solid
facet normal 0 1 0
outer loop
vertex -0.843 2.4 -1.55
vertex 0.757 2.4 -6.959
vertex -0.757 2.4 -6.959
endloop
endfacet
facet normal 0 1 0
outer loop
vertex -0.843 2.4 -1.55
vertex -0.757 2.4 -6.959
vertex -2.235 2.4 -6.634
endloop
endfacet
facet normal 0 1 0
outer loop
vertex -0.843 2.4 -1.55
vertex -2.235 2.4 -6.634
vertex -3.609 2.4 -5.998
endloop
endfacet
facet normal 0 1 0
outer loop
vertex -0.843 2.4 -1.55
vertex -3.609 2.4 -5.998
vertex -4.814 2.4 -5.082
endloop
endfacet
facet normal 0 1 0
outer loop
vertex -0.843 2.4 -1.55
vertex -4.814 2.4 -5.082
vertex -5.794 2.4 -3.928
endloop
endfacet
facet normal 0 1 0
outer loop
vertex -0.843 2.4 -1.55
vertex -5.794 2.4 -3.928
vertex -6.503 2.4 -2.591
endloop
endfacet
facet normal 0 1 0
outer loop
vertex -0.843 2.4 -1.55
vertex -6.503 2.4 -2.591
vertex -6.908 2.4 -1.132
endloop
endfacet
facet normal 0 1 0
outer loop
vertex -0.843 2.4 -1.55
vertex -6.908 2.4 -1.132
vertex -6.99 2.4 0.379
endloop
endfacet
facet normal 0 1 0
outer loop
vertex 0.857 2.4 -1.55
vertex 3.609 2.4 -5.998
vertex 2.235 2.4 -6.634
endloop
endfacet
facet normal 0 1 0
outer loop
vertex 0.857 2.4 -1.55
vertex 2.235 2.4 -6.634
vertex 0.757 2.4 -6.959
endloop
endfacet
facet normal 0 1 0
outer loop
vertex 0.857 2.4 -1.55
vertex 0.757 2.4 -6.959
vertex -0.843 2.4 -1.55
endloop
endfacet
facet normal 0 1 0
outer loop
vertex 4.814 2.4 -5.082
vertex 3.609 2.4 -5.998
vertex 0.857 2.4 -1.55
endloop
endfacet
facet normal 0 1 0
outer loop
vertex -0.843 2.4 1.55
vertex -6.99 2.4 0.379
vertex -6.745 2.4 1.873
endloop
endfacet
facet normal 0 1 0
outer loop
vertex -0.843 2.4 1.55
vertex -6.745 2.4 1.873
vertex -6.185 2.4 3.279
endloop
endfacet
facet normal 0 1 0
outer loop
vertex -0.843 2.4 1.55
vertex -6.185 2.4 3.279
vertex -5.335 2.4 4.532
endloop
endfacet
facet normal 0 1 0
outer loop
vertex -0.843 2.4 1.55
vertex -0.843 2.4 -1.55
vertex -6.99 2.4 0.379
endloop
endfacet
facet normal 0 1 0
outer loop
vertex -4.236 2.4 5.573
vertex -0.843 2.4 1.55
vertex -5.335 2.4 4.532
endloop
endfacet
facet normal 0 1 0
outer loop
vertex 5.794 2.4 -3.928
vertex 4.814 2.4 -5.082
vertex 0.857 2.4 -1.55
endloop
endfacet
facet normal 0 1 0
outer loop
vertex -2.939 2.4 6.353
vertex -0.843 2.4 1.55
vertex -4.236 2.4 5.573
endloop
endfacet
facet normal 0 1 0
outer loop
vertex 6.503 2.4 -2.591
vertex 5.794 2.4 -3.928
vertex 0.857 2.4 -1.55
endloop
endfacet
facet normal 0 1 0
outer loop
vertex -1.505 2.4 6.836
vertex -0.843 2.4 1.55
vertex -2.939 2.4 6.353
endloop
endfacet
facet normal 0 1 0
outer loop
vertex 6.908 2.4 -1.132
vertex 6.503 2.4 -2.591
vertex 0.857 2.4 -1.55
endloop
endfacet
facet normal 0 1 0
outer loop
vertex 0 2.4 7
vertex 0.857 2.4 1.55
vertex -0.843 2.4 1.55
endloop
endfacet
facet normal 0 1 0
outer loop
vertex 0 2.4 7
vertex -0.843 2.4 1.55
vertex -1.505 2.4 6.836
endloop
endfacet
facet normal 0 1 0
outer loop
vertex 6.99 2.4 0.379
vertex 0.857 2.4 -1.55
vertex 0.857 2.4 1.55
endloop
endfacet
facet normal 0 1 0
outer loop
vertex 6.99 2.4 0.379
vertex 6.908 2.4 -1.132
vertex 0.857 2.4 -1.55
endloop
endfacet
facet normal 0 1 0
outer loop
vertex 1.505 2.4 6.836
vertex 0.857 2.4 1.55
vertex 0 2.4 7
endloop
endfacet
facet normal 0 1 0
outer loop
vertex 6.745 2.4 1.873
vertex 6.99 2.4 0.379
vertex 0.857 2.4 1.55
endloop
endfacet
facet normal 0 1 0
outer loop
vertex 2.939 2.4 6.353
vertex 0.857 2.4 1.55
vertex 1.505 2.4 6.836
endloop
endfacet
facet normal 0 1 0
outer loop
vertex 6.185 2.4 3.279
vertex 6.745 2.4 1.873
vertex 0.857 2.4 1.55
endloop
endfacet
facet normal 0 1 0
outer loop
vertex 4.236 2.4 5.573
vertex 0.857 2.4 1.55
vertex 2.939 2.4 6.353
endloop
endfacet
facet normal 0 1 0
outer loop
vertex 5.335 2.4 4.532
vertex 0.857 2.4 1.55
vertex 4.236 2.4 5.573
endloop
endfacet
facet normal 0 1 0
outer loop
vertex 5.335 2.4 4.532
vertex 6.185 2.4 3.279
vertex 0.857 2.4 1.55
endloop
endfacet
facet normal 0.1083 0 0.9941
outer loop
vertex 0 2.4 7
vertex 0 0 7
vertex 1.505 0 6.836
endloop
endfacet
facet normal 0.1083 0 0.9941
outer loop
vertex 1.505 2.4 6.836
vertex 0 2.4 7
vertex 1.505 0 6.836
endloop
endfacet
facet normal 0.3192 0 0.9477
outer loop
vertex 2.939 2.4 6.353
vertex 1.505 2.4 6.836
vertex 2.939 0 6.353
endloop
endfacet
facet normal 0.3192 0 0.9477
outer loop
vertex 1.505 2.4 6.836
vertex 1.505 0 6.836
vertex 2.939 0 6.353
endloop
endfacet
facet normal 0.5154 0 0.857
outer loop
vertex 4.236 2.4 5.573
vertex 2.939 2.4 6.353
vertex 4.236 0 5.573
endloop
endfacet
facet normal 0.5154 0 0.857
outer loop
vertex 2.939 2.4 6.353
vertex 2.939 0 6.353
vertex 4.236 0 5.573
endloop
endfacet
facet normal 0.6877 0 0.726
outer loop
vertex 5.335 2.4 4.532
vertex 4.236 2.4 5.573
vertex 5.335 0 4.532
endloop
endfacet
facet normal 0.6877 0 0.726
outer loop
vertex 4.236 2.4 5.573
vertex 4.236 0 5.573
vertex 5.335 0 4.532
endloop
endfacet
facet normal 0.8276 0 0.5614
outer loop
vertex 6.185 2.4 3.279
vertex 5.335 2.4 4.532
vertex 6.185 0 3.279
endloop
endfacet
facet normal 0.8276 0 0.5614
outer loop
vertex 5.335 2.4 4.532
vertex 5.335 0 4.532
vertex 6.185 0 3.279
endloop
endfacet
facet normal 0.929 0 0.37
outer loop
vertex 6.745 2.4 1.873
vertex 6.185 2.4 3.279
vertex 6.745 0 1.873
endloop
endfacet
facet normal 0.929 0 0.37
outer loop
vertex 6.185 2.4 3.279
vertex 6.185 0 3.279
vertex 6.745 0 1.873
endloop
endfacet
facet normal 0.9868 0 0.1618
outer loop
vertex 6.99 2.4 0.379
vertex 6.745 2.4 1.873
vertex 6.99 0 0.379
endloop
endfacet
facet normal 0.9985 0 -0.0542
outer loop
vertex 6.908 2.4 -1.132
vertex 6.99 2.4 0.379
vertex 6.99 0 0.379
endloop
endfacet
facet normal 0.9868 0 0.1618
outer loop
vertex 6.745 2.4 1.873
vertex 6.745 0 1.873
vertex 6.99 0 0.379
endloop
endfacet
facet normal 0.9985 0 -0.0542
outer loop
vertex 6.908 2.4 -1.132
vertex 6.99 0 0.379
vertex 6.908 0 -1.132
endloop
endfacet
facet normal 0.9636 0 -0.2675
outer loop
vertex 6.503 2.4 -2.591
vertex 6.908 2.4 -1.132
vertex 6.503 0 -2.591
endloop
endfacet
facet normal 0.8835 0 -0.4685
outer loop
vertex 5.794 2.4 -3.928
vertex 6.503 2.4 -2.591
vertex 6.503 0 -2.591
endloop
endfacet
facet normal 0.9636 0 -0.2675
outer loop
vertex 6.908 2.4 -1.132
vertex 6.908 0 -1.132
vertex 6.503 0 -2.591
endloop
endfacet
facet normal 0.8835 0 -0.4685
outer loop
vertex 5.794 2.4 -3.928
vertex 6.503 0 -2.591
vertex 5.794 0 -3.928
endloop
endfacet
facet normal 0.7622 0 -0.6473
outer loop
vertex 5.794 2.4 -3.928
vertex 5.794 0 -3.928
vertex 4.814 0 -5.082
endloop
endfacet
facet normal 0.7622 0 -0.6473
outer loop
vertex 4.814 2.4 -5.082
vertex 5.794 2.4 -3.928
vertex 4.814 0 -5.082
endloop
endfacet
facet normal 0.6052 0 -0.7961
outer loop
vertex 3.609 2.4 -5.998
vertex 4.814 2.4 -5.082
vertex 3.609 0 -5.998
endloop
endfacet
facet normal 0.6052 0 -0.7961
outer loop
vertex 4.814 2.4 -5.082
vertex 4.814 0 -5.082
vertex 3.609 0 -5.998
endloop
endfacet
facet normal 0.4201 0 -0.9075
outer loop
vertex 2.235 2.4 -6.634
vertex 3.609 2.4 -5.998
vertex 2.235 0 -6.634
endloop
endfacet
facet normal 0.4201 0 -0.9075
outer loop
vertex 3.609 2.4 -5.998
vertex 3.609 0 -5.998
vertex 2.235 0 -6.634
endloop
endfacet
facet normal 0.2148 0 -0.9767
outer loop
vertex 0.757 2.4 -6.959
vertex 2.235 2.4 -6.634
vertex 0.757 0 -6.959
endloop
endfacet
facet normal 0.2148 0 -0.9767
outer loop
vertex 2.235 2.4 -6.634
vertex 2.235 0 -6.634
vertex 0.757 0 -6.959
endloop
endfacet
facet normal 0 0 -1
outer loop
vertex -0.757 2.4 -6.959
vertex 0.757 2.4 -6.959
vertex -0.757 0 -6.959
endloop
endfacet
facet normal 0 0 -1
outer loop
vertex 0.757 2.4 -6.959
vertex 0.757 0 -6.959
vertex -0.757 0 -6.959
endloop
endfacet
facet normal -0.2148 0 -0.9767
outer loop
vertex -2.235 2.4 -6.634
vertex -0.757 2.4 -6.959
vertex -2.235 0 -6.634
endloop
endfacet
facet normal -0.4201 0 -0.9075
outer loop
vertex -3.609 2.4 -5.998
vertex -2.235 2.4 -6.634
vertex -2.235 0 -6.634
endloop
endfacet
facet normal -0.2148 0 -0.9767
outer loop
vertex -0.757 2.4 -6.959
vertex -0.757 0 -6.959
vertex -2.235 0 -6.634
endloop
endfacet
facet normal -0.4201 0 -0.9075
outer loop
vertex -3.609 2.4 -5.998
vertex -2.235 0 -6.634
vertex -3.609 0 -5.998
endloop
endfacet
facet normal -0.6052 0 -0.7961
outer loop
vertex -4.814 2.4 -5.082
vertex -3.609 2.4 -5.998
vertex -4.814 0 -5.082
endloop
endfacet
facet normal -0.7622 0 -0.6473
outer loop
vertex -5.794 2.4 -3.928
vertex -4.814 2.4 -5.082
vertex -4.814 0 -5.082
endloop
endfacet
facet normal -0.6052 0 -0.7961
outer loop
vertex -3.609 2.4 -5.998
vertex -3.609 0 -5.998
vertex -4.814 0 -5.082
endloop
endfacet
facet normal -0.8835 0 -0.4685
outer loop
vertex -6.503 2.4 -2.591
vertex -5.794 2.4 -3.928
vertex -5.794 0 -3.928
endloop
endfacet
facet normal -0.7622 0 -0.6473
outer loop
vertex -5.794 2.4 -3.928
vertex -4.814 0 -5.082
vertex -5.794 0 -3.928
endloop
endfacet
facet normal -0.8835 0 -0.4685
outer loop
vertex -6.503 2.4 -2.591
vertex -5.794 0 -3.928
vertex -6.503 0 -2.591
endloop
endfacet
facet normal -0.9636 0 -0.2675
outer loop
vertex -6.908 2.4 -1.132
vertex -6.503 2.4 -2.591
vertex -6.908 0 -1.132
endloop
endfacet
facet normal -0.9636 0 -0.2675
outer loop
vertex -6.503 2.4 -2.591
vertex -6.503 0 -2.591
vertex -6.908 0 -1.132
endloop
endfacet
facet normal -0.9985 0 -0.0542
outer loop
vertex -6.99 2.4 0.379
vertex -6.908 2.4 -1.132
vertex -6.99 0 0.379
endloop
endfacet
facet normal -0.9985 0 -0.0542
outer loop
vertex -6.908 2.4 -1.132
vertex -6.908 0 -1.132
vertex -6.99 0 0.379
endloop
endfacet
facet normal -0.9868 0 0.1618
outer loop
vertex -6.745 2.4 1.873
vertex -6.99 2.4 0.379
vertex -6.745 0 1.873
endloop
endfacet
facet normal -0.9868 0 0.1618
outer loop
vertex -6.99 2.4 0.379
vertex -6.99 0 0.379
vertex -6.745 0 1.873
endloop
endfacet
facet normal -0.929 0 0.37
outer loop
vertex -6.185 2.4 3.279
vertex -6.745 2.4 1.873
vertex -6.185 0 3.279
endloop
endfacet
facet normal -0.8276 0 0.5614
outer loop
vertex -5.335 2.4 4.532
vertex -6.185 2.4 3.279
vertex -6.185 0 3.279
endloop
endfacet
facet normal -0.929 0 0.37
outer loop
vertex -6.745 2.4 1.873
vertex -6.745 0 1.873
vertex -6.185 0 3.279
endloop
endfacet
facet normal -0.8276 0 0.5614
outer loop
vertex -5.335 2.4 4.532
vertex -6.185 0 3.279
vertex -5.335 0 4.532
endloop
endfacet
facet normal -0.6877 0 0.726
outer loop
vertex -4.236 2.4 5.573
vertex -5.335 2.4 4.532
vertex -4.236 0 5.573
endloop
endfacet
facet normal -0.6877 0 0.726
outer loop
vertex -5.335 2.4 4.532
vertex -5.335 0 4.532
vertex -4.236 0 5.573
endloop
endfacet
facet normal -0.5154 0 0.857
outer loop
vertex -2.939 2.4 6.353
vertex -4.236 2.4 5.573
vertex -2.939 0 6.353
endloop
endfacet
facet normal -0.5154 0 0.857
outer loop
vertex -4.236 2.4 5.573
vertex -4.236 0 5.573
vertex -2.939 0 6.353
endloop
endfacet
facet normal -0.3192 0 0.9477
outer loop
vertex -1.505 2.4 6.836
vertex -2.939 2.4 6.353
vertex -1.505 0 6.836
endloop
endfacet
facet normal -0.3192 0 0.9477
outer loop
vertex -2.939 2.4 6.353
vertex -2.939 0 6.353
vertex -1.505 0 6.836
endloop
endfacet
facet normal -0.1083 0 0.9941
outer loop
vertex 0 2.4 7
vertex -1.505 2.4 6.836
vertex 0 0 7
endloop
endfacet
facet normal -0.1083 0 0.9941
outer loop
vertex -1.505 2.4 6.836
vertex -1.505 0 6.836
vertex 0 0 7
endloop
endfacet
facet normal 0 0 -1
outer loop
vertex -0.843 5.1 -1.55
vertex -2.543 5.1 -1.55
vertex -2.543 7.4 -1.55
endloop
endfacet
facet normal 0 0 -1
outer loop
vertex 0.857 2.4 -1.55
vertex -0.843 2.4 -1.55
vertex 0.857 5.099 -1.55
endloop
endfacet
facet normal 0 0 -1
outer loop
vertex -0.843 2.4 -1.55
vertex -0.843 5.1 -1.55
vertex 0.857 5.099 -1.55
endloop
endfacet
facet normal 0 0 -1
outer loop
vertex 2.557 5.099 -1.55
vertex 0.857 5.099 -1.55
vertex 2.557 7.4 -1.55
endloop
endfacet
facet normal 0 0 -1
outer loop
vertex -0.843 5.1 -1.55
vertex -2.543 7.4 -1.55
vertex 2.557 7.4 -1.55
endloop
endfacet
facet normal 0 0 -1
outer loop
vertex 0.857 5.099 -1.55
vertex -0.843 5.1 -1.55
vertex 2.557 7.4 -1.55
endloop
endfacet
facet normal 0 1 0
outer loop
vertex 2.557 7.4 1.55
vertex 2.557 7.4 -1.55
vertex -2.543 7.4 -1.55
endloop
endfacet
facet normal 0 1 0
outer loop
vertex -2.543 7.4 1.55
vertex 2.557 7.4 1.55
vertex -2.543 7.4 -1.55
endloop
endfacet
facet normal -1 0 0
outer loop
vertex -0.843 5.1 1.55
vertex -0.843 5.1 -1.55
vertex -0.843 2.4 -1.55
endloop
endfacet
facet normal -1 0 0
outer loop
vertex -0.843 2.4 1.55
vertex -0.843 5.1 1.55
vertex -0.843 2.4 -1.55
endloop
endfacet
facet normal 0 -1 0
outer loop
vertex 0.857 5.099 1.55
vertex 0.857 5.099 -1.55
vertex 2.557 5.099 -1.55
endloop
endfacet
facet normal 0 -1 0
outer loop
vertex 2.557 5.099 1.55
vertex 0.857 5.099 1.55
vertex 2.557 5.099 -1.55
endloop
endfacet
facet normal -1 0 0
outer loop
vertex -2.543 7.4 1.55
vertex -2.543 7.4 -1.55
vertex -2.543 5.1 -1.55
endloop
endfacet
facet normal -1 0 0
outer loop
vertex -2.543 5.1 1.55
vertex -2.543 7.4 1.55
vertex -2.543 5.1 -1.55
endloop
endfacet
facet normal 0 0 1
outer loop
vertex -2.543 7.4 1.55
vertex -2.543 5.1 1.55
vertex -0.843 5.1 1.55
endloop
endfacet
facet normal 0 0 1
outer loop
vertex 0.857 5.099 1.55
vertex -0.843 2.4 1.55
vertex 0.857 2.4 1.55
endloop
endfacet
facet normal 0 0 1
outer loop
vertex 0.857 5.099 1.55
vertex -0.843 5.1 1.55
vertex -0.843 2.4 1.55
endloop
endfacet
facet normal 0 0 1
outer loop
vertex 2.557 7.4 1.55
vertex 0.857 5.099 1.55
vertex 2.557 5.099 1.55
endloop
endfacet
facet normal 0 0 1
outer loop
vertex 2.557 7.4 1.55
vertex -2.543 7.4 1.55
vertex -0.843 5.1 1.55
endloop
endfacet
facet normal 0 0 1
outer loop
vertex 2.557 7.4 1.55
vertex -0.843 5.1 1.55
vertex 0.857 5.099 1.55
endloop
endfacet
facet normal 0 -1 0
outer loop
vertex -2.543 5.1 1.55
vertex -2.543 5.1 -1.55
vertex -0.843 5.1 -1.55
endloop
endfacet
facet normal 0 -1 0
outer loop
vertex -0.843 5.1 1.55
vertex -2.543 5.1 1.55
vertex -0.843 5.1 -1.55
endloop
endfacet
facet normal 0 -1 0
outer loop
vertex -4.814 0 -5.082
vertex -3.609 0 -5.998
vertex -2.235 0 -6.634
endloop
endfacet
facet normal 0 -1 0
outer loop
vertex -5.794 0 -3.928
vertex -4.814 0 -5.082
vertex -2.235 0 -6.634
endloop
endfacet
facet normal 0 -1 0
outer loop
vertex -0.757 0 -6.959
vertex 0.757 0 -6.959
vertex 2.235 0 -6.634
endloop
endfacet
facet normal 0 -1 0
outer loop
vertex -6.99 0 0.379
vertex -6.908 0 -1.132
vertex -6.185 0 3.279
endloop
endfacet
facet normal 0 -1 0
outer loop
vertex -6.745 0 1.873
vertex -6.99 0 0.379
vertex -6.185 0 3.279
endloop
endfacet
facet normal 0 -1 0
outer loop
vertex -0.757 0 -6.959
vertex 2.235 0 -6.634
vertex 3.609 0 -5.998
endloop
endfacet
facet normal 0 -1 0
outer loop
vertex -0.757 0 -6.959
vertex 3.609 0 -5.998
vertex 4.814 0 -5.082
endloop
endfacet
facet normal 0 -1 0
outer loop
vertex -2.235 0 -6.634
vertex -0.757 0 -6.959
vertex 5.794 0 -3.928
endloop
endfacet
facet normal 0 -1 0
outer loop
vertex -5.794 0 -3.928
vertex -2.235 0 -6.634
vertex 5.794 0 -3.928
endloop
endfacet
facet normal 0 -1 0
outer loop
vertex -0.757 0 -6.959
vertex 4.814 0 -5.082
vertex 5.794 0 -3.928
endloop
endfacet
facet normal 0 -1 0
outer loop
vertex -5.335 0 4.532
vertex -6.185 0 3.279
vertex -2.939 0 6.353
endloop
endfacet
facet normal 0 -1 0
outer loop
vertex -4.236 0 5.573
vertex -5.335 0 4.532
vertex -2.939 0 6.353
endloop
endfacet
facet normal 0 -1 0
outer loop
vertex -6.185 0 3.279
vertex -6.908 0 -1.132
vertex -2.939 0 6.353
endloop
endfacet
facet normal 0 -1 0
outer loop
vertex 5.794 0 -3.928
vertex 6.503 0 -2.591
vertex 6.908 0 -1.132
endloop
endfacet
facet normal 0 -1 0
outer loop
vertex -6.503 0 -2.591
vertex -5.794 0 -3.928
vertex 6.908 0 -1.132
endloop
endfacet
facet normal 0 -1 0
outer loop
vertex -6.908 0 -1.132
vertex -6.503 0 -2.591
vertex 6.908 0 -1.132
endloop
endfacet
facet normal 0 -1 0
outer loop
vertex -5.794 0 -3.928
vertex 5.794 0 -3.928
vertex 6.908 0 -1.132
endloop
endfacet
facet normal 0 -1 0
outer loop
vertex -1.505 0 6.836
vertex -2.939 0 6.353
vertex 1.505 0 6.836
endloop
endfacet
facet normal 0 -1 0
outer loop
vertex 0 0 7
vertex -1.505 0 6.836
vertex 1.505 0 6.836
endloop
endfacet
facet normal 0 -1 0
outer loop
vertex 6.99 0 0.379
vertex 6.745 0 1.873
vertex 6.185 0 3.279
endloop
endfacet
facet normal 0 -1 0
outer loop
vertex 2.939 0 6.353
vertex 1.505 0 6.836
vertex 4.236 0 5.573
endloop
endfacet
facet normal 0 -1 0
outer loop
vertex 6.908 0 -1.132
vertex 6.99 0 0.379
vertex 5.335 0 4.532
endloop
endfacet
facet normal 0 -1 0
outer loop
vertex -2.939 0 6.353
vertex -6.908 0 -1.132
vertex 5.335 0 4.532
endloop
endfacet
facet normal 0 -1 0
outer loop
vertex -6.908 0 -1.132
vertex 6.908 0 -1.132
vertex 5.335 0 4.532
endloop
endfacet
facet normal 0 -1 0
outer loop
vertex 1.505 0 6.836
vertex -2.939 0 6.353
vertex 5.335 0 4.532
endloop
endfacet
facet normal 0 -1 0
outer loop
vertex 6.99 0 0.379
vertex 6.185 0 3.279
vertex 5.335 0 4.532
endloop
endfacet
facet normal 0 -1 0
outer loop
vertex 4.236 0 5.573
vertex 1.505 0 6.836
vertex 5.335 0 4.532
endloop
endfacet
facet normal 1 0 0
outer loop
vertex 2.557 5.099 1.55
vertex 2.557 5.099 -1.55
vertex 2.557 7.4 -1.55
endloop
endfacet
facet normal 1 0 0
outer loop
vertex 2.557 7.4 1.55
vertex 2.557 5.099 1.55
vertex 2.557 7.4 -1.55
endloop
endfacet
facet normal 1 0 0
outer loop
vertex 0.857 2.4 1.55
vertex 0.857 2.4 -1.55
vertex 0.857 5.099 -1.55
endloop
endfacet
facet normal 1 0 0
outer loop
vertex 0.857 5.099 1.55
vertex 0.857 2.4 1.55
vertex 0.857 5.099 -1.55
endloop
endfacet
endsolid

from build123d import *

# Parameters (mm, degrees)
SKETCH1_R                = 7
BOSS_EXTRUDE1_DEPTH      = 2.4
BOSS_EXTRUDE3_DEPTH      = 1.55
BOSS_EXTRUDE3_DEPTH_BACK = 1.55


with BuildPart() as part:
    # Sketch1 → Boss-Extrude1 (new body)
    with BuildSketch(Plane(origin=(0, 0, 0), x_dir=(1, 0, 0), z_dir=(0, 1, 0))):
        Circle(SKETCH1_R)
    extrude(amount=BOSS_EXTRUDE1_DEPTH)

    # Sketch3 → Boss-Extrude3 (add, two sides: drawn at the far end of the back side and taken through both)
    with BuildSketch(Plane.XY.offset(-BOSS_EXTRUDE3_DEPTH_BACK)):
        Polygon((-0.843447487, 2.4), (0, 2.4), (0.856552513, 2.4), (0.856552513, 5.098601719), (2.556552513, 5.098601719), (2.556552513, 7.4), (-2.543447487, 7.4), (-2.543447487, 5.1), (-0.843447487, 5.1), align=None)
    extrude(amount=BOSS_EXTRUDE3_DEPTH + BOSS_EXTRUDE3_DEPTH_BACK)


solid = part.part
